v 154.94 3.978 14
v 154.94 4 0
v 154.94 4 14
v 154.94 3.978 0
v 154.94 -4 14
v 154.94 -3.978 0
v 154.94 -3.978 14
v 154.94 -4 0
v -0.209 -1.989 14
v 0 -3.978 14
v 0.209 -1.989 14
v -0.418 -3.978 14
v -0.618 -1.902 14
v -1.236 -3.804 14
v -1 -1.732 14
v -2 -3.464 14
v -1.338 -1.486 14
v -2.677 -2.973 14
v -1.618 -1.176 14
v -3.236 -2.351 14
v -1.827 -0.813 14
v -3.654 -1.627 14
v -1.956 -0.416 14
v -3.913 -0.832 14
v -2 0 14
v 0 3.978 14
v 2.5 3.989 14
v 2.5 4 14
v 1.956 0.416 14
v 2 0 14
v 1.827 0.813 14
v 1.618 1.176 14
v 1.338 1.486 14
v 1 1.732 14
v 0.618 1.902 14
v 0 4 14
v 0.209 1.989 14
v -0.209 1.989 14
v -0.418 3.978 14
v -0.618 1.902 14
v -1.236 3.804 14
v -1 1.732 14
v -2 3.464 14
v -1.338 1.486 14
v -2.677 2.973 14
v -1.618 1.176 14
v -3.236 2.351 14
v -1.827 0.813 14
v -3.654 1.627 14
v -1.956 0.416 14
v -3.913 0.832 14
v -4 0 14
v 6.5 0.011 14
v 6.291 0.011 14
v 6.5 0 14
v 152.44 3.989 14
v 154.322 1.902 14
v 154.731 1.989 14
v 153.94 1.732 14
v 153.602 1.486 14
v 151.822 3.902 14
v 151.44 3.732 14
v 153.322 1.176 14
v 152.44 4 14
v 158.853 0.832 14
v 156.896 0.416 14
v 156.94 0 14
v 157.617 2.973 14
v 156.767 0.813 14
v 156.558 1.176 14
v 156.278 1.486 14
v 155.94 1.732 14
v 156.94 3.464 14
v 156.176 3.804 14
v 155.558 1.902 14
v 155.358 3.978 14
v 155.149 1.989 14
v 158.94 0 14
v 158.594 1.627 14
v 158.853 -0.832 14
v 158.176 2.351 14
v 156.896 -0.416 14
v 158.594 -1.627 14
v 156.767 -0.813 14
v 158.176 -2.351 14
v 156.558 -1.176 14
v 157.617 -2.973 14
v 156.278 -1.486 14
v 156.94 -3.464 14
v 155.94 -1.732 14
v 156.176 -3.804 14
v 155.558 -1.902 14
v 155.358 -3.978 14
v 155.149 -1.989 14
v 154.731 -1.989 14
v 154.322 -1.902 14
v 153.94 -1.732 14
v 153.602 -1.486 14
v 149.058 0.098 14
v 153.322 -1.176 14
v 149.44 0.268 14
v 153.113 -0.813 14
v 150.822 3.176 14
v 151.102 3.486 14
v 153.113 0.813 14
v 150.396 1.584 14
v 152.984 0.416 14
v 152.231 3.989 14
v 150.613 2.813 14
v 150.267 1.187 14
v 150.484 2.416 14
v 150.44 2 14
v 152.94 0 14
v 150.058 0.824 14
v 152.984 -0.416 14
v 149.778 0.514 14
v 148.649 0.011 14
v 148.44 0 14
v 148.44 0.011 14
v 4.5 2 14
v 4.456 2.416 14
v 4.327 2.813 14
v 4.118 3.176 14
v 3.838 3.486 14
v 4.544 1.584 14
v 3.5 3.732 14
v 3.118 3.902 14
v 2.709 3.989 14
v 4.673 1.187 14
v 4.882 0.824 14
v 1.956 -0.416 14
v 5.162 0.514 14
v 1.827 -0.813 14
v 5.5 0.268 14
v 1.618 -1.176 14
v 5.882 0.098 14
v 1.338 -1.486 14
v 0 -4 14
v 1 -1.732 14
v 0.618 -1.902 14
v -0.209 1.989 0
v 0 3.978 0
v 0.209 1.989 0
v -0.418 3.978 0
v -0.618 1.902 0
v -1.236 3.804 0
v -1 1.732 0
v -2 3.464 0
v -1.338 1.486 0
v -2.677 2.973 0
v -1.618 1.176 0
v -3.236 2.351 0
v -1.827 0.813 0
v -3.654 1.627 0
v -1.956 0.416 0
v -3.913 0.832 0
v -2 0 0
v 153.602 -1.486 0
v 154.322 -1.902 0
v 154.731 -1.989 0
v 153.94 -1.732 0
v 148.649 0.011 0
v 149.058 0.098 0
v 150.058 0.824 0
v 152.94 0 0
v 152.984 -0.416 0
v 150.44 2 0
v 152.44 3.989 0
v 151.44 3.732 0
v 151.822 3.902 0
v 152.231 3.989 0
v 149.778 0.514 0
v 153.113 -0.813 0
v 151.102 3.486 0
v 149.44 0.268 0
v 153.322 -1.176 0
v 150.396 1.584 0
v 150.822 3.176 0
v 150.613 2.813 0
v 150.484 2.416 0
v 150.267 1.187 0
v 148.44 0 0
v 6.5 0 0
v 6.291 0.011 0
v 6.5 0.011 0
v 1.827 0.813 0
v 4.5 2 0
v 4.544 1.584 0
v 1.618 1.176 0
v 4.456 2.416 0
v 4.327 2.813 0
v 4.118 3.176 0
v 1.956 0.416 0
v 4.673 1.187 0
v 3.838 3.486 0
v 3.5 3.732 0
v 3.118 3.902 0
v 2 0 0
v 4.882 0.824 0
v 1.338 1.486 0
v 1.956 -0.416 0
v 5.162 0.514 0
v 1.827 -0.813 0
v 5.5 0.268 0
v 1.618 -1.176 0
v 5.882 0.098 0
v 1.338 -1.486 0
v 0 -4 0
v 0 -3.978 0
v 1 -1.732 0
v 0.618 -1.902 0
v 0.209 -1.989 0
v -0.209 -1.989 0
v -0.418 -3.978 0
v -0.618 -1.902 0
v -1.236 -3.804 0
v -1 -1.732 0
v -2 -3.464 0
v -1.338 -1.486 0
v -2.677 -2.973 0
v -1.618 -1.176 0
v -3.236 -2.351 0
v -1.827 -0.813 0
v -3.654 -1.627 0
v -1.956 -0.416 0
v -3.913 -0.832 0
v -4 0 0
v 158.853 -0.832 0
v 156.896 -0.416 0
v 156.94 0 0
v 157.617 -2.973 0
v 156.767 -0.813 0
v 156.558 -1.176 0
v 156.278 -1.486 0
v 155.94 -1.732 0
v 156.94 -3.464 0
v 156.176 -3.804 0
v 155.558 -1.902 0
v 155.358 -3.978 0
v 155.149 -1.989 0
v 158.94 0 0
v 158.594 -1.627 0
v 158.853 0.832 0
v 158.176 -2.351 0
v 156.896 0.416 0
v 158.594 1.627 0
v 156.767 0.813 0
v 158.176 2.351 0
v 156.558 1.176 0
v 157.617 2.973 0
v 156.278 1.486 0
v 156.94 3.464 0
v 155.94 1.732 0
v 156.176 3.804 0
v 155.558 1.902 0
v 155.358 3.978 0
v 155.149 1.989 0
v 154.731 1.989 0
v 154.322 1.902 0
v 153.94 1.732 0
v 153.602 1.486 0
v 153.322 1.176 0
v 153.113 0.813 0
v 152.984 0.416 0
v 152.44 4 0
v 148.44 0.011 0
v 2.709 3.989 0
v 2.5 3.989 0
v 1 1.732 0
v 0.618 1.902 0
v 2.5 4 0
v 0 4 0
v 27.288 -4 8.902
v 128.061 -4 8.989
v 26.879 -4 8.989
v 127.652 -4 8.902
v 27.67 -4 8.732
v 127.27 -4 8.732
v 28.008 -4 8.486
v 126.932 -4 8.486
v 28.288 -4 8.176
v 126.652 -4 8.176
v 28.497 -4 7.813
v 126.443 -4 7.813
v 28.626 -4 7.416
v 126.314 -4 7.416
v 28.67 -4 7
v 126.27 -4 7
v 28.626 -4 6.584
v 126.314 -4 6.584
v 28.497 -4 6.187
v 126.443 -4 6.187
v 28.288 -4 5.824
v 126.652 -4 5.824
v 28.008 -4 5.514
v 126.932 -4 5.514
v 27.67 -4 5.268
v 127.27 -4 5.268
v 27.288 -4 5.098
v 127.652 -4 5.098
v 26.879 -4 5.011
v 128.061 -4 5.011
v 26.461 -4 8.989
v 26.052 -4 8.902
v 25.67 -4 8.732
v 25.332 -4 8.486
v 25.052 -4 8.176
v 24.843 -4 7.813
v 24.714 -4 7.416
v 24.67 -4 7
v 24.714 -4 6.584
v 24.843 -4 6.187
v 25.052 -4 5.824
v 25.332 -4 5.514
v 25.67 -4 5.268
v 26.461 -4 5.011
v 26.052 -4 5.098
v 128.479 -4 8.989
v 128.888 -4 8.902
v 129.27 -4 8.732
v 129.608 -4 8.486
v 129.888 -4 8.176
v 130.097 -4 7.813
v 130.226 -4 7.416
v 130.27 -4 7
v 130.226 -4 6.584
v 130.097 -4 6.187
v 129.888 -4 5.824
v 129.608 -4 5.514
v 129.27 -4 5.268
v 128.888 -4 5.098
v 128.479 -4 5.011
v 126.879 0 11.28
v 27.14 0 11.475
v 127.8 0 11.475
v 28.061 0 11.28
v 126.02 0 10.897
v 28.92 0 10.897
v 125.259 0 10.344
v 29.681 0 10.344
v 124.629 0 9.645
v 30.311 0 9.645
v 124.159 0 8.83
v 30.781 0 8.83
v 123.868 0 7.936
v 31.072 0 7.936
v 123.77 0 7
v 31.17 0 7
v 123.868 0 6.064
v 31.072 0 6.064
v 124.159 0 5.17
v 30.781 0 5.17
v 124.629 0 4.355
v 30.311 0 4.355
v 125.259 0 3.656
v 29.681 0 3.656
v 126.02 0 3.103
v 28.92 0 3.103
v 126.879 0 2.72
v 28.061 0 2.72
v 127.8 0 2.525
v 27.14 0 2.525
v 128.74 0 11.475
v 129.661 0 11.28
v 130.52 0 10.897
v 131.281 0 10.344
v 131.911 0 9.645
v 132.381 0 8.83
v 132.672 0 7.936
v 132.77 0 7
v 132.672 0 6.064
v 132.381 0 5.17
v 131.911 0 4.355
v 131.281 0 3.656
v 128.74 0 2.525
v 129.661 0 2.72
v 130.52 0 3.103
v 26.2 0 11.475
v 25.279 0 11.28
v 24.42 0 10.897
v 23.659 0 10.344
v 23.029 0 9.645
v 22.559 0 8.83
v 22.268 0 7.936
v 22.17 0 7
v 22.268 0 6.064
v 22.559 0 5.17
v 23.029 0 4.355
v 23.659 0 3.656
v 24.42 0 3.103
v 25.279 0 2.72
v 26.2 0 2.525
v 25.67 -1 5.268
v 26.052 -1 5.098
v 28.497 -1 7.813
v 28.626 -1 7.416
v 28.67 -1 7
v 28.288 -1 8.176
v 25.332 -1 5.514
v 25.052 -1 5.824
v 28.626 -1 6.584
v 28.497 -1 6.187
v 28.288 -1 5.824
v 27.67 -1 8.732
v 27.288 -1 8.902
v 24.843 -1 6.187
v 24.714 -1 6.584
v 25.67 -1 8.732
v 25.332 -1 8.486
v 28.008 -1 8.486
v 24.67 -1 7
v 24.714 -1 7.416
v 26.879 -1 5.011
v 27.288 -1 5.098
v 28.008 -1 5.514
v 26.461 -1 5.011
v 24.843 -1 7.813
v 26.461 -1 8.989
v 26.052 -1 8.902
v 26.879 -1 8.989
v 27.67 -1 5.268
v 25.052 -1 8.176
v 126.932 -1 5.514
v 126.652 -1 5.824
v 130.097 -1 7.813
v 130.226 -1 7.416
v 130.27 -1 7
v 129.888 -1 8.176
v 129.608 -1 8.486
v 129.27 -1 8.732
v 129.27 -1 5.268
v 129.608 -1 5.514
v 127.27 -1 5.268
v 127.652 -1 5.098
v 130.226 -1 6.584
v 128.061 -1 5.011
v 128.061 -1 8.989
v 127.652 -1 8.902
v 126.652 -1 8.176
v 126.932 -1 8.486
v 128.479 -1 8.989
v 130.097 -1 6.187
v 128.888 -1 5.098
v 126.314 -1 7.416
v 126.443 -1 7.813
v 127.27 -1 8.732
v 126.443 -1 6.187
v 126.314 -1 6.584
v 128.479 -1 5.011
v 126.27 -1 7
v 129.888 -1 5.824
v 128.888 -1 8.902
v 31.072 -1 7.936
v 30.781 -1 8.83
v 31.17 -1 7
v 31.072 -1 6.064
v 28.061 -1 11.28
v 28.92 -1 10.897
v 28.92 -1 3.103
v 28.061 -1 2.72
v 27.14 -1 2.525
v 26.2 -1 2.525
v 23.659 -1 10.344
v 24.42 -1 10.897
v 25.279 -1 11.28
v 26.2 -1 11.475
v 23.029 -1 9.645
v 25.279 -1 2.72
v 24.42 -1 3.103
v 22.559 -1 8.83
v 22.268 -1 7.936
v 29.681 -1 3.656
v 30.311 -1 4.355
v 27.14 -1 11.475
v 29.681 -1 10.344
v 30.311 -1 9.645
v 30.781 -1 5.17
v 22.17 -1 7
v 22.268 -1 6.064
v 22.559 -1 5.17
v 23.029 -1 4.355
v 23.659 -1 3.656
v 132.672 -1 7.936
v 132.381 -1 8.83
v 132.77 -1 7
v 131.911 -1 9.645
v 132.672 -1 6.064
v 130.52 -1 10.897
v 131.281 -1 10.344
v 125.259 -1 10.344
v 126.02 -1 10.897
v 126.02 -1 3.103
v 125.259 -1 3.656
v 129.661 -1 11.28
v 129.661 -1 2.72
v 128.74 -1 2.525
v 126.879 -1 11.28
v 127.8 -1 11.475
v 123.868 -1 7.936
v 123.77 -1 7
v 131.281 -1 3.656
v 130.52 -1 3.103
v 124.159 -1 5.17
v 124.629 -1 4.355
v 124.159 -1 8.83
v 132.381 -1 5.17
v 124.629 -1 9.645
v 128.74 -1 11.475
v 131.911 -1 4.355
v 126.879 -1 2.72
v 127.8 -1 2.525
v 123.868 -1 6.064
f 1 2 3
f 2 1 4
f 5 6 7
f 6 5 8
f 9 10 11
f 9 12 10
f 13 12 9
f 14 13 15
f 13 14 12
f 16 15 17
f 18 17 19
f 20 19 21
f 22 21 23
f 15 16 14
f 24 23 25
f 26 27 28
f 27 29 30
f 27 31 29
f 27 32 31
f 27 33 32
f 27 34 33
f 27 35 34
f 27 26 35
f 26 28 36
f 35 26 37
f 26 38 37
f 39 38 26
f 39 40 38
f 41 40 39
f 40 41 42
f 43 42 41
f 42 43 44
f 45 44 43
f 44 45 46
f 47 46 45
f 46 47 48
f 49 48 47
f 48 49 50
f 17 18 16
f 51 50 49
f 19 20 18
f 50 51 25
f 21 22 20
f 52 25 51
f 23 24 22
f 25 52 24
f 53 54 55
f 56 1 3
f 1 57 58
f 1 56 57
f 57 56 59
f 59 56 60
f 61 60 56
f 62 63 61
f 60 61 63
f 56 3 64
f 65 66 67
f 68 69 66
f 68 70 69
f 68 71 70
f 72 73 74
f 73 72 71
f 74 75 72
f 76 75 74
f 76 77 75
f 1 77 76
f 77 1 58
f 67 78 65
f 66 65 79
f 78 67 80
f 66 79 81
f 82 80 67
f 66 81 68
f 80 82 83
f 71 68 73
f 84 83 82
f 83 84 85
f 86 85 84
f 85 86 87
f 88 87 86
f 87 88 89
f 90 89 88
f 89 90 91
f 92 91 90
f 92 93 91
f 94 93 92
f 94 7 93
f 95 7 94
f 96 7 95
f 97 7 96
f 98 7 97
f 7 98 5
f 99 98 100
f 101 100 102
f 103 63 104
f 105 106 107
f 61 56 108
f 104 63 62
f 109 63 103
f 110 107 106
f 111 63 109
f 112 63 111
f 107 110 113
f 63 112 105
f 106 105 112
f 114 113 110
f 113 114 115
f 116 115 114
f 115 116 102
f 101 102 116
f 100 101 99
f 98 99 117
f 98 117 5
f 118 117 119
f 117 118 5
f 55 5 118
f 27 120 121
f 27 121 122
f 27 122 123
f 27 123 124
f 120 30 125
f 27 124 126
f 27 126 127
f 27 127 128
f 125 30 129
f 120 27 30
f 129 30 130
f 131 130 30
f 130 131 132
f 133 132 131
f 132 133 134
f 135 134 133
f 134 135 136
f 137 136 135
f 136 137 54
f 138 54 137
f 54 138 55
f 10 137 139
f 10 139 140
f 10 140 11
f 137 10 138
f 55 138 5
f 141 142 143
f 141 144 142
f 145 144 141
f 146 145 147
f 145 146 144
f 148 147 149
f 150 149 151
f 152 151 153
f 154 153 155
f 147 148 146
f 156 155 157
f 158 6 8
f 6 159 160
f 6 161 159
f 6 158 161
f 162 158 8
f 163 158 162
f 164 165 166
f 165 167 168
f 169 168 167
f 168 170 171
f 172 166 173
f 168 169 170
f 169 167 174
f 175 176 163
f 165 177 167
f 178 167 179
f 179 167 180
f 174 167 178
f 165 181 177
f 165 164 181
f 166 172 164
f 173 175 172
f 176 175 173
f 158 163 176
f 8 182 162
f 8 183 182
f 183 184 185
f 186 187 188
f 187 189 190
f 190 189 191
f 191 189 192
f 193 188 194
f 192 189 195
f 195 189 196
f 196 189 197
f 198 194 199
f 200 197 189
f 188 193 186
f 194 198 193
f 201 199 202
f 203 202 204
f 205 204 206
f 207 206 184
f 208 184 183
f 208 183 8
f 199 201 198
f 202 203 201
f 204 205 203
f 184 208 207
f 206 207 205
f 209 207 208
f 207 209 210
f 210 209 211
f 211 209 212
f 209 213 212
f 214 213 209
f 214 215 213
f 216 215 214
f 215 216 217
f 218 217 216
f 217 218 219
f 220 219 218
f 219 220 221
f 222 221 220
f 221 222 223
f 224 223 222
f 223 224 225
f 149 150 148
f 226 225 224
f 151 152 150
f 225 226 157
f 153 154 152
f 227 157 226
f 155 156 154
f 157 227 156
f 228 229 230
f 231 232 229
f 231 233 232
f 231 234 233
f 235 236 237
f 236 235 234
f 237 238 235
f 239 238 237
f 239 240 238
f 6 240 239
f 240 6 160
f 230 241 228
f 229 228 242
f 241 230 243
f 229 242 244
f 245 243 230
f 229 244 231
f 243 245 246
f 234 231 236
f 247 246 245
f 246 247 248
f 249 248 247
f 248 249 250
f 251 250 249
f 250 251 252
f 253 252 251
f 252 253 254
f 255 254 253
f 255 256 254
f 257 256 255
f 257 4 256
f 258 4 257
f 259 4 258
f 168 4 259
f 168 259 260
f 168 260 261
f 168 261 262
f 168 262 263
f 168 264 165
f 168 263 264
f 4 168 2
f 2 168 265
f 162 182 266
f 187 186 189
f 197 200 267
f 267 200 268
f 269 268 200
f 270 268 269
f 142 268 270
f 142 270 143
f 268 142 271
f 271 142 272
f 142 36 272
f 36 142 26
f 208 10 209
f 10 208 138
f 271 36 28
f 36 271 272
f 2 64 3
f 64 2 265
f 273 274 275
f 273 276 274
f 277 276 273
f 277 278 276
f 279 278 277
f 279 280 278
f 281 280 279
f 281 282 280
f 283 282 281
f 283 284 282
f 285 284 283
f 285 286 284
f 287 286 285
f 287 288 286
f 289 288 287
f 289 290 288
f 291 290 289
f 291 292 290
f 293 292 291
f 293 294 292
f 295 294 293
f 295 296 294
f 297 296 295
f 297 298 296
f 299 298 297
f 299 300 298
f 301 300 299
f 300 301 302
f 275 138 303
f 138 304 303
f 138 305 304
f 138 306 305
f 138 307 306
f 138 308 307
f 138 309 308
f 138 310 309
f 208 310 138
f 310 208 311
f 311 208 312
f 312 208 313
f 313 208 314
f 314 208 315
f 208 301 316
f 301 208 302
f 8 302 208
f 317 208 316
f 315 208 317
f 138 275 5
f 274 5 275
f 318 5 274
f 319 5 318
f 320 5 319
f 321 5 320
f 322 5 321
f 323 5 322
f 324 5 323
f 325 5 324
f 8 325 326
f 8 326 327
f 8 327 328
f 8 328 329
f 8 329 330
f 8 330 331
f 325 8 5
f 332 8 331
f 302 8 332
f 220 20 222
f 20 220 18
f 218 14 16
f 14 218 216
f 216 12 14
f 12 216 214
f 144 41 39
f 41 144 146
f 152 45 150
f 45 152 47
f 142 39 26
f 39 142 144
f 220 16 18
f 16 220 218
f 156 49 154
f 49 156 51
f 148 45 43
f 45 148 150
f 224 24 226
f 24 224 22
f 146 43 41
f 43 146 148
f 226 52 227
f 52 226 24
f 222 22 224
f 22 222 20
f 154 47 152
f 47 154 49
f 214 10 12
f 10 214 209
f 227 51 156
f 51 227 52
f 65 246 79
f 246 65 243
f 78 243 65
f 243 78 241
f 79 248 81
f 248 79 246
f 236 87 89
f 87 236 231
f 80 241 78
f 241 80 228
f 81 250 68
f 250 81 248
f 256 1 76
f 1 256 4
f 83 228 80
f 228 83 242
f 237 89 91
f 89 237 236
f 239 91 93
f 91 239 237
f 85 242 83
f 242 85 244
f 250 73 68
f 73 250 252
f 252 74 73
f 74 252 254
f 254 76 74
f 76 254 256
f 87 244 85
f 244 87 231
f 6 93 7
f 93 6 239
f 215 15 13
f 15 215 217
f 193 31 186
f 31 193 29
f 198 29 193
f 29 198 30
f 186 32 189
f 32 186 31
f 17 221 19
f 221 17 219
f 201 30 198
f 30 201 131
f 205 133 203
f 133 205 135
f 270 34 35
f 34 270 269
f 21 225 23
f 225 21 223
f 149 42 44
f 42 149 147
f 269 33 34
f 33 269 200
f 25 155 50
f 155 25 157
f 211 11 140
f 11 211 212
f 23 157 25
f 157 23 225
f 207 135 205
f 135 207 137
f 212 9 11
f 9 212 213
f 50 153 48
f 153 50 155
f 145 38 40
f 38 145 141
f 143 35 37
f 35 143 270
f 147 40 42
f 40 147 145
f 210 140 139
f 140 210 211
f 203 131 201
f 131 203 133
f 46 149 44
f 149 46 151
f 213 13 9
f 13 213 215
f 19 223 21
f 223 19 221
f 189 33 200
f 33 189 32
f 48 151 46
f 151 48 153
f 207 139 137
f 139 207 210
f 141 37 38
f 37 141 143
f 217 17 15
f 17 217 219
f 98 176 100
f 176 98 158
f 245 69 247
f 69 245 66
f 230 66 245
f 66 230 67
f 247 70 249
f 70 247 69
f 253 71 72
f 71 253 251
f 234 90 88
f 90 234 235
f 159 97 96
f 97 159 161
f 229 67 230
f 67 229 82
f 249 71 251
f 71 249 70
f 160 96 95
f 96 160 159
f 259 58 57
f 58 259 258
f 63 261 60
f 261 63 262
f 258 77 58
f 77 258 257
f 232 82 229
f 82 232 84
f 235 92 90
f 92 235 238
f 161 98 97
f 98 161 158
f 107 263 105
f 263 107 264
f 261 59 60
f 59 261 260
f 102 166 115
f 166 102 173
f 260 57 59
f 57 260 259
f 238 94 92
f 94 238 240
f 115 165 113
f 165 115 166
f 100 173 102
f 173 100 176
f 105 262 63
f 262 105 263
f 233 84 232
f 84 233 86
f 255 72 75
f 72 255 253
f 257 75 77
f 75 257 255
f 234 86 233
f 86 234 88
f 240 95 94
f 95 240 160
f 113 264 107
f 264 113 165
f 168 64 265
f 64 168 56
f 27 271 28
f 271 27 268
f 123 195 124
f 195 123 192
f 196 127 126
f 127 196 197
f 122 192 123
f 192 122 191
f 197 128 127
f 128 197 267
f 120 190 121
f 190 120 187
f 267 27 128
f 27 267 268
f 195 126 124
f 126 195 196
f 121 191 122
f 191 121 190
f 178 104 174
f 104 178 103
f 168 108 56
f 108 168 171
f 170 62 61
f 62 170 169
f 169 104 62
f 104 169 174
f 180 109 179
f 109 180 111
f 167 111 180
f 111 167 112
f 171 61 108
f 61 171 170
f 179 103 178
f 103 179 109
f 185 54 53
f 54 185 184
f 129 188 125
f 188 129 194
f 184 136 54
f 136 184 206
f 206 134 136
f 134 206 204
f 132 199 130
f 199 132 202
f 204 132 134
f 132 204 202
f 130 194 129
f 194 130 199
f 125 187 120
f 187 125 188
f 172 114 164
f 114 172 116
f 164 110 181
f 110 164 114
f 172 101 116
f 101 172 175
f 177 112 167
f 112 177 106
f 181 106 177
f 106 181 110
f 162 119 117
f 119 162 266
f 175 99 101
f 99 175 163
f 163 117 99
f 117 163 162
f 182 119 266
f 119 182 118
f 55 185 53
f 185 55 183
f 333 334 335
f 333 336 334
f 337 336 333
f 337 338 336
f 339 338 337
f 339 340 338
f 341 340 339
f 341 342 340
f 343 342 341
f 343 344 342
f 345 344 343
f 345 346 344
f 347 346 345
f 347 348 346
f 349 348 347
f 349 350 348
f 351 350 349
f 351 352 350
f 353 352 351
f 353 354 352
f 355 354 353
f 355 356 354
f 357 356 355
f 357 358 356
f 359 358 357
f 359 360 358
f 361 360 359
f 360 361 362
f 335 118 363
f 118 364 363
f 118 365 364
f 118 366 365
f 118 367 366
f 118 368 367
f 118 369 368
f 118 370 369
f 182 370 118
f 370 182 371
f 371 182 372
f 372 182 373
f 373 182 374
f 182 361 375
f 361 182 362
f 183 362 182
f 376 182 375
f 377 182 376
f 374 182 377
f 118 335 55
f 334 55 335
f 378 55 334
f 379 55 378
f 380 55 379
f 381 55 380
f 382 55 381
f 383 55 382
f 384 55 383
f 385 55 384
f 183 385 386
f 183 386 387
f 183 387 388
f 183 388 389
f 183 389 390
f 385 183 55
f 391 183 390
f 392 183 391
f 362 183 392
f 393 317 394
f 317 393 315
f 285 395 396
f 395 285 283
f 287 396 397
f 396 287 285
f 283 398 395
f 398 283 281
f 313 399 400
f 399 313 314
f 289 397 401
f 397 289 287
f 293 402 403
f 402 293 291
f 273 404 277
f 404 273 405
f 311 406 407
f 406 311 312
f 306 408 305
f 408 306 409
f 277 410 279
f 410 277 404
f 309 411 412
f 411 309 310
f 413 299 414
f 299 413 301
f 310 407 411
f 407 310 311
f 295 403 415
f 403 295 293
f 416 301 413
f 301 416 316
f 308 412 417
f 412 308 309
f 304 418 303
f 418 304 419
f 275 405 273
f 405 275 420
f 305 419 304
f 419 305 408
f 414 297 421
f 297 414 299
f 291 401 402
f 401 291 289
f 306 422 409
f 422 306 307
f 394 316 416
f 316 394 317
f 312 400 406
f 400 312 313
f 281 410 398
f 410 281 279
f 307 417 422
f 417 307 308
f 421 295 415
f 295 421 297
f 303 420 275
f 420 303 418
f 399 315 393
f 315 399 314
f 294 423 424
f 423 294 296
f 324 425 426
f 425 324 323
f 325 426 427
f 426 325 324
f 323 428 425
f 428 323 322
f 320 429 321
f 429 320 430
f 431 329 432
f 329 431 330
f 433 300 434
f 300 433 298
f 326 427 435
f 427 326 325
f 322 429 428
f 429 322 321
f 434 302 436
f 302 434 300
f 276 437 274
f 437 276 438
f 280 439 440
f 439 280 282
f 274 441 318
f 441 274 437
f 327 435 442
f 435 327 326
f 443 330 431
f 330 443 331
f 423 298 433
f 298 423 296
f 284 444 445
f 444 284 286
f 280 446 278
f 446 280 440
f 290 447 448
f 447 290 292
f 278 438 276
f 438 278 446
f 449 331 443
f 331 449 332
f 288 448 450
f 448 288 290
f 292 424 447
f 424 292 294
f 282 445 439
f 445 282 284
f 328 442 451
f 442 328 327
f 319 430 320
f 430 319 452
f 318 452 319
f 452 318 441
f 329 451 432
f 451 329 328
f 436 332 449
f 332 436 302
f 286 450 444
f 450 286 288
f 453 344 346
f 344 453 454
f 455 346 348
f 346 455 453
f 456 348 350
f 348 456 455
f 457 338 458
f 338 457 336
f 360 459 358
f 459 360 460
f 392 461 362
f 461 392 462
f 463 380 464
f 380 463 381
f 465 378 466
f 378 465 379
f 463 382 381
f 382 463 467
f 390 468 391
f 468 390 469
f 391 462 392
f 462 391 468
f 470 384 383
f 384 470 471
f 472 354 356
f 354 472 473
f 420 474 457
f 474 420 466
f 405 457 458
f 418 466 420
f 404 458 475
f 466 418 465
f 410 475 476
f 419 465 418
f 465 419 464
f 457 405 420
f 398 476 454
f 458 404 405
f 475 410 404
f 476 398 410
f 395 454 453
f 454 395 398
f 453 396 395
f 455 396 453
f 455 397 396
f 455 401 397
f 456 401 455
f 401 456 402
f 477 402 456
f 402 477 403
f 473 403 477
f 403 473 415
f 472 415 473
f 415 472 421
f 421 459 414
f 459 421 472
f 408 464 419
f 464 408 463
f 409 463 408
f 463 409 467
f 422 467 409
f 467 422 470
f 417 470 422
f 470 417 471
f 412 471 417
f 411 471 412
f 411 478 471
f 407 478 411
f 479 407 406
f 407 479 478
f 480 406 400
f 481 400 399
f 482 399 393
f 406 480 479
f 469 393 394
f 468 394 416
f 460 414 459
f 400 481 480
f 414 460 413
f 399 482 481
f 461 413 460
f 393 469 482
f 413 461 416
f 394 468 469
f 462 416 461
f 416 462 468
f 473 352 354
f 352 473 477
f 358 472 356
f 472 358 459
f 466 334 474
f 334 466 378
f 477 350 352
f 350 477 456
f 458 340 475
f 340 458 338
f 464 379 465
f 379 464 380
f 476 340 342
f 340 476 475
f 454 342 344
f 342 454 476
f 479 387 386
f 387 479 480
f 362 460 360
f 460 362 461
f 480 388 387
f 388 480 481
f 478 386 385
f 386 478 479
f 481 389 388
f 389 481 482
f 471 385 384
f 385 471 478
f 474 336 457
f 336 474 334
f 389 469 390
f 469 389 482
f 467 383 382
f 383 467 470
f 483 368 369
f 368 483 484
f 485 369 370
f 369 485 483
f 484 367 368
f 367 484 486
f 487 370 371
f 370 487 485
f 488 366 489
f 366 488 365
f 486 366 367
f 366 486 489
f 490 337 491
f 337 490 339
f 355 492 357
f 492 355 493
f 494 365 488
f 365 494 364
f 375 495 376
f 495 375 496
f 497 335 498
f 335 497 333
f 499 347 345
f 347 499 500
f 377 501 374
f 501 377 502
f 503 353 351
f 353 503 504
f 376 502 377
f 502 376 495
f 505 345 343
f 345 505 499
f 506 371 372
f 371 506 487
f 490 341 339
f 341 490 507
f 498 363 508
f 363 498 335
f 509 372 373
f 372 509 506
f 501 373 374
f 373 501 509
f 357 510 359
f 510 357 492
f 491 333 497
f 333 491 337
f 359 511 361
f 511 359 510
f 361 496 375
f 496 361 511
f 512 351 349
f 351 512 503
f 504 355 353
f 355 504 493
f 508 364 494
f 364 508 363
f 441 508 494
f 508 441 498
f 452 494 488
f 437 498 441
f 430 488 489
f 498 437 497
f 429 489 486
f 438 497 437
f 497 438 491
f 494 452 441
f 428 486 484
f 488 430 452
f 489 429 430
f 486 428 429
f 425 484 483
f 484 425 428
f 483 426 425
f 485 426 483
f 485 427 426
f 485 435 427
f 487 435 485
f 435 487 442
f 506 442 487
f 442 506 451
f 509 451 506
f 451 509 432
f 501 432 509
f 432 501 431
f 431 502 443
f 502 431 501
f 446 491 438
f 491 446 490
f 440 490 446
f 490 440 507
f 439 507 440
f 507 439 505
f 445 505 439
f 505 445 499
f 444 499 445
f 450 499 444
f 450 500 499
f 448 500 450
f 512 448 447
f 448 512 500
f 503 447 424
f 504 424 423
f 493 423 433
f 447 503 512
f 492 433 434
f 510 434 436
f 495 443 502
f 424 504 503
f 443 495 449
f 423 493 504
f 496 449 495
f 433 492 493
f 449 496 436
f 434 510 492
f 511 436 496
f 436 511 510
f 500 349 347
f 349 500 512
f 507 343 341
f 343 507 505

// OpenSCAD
// Author: Charlie Snyder
// Twitter Handle: @mjrsnyder

$fn=30;

hole_spacing=154.94;
total_length=162;
bar_width=8;
bar_thickness=14;

hdd_hole_min_thickness=3;
hdd_hole_spacing=60+41.6;
hdd_countersink_diameter=9;

cutout_length_offset=13;

difference() {
    bar(bar_width, bar_thickness, hole_spacing);
    bar_holes(bar_thickness, hole_spacing);
    bar_cutout(cutout_length_offset, bar_width/2, hole_spacing, bar_thickness, bar_width);
    rotate(a=90, v=[1,0,0]){
      translate([(hole_spacing - hdd_hole_spacing)/2, bar_thickness/2, bar_width/2*-1]){
        hdd_holes(bar_width, 4, hdd_hole_spacing);
        hdd_countersink(hdd_countersink_diameter, bar_width, hdd_hole_min_thickness, hdd_hole_spacing);
      };
    };
};

module bar_cutout(length_offset, cutout_depth, hole_spacing, bar_thickness, bar_width) {
  length=hole_spacing - length_offset;
  diff=(hole_spacing - length)/2;
  translate([diff, cutout_depth/2 ,0]){
    cylinder(r=cutout_depth/2, h=bar_thickness);
  }
  translate([diff+length, cutout_depth/2 ,0]){
    cylinder(r=cutout_depth/2, h=bar_thickness);
  }
  difference(){
    translate([diff-(cutout_depth), cutout_depth/2 ,0]){
      cube([cutout_depth*2+length, cutout_depth/2, bar_thickness]);
    }

     translate([diff-(cutout_depth), cutout_depth/2 ,0]){
      cylinder(r=cutout_depth/2, h=bar_thickness);
    }

     translate([diff+length+(cutout_depth), cutout_depth/2 ,0]){
      cylinder(r=cutout_depth/2, h=bar_thickness);
    }
  }

  translate([diff, 0, 0]){
    cube([length, cutout_depth, bar_thickness]);
  }
}

module bar(width, thickness, hole_spacing) {
  translate([0, bar_width/2 * -1]){  
    cube([hole_spacing,bar_width,bar_thickness]);
  }
  cylinder(r=bar_width/2, h=bar_thickness);  
  translate([hole_spacing, 0]){
    cylinder(r=bar_width/2, h=bar_thickness);    
  };
};

module bar_holes(bar_thickness, hole_spacing) {
  cylinder(r=2, h=bar_thickness);
  translate([hole_spacing, 0]){
    cylinder(r=2, h=bar_thickness);    
  };  
}


module hdd_holes(hole_depth, hole_diameter, hdd_hole_spacing) {
  cylinder(r=hole_diameter/2, hole_depth+1);
  translate([hdd_hole_spacing, 0]){
    cylinder(r=hole_diameter/2, hole_depth+1);
  };
}

module hdd_countersink(diameter, total_depth, min_material, hole_spacing) {
  hole_depth=total_depth - min_material;
  cylinder(r=diameter/2, hole_depth);
  translate([hole_spacing, 0]){
    cylinder(r=diameter/2, hole_depth);
  };   
}
